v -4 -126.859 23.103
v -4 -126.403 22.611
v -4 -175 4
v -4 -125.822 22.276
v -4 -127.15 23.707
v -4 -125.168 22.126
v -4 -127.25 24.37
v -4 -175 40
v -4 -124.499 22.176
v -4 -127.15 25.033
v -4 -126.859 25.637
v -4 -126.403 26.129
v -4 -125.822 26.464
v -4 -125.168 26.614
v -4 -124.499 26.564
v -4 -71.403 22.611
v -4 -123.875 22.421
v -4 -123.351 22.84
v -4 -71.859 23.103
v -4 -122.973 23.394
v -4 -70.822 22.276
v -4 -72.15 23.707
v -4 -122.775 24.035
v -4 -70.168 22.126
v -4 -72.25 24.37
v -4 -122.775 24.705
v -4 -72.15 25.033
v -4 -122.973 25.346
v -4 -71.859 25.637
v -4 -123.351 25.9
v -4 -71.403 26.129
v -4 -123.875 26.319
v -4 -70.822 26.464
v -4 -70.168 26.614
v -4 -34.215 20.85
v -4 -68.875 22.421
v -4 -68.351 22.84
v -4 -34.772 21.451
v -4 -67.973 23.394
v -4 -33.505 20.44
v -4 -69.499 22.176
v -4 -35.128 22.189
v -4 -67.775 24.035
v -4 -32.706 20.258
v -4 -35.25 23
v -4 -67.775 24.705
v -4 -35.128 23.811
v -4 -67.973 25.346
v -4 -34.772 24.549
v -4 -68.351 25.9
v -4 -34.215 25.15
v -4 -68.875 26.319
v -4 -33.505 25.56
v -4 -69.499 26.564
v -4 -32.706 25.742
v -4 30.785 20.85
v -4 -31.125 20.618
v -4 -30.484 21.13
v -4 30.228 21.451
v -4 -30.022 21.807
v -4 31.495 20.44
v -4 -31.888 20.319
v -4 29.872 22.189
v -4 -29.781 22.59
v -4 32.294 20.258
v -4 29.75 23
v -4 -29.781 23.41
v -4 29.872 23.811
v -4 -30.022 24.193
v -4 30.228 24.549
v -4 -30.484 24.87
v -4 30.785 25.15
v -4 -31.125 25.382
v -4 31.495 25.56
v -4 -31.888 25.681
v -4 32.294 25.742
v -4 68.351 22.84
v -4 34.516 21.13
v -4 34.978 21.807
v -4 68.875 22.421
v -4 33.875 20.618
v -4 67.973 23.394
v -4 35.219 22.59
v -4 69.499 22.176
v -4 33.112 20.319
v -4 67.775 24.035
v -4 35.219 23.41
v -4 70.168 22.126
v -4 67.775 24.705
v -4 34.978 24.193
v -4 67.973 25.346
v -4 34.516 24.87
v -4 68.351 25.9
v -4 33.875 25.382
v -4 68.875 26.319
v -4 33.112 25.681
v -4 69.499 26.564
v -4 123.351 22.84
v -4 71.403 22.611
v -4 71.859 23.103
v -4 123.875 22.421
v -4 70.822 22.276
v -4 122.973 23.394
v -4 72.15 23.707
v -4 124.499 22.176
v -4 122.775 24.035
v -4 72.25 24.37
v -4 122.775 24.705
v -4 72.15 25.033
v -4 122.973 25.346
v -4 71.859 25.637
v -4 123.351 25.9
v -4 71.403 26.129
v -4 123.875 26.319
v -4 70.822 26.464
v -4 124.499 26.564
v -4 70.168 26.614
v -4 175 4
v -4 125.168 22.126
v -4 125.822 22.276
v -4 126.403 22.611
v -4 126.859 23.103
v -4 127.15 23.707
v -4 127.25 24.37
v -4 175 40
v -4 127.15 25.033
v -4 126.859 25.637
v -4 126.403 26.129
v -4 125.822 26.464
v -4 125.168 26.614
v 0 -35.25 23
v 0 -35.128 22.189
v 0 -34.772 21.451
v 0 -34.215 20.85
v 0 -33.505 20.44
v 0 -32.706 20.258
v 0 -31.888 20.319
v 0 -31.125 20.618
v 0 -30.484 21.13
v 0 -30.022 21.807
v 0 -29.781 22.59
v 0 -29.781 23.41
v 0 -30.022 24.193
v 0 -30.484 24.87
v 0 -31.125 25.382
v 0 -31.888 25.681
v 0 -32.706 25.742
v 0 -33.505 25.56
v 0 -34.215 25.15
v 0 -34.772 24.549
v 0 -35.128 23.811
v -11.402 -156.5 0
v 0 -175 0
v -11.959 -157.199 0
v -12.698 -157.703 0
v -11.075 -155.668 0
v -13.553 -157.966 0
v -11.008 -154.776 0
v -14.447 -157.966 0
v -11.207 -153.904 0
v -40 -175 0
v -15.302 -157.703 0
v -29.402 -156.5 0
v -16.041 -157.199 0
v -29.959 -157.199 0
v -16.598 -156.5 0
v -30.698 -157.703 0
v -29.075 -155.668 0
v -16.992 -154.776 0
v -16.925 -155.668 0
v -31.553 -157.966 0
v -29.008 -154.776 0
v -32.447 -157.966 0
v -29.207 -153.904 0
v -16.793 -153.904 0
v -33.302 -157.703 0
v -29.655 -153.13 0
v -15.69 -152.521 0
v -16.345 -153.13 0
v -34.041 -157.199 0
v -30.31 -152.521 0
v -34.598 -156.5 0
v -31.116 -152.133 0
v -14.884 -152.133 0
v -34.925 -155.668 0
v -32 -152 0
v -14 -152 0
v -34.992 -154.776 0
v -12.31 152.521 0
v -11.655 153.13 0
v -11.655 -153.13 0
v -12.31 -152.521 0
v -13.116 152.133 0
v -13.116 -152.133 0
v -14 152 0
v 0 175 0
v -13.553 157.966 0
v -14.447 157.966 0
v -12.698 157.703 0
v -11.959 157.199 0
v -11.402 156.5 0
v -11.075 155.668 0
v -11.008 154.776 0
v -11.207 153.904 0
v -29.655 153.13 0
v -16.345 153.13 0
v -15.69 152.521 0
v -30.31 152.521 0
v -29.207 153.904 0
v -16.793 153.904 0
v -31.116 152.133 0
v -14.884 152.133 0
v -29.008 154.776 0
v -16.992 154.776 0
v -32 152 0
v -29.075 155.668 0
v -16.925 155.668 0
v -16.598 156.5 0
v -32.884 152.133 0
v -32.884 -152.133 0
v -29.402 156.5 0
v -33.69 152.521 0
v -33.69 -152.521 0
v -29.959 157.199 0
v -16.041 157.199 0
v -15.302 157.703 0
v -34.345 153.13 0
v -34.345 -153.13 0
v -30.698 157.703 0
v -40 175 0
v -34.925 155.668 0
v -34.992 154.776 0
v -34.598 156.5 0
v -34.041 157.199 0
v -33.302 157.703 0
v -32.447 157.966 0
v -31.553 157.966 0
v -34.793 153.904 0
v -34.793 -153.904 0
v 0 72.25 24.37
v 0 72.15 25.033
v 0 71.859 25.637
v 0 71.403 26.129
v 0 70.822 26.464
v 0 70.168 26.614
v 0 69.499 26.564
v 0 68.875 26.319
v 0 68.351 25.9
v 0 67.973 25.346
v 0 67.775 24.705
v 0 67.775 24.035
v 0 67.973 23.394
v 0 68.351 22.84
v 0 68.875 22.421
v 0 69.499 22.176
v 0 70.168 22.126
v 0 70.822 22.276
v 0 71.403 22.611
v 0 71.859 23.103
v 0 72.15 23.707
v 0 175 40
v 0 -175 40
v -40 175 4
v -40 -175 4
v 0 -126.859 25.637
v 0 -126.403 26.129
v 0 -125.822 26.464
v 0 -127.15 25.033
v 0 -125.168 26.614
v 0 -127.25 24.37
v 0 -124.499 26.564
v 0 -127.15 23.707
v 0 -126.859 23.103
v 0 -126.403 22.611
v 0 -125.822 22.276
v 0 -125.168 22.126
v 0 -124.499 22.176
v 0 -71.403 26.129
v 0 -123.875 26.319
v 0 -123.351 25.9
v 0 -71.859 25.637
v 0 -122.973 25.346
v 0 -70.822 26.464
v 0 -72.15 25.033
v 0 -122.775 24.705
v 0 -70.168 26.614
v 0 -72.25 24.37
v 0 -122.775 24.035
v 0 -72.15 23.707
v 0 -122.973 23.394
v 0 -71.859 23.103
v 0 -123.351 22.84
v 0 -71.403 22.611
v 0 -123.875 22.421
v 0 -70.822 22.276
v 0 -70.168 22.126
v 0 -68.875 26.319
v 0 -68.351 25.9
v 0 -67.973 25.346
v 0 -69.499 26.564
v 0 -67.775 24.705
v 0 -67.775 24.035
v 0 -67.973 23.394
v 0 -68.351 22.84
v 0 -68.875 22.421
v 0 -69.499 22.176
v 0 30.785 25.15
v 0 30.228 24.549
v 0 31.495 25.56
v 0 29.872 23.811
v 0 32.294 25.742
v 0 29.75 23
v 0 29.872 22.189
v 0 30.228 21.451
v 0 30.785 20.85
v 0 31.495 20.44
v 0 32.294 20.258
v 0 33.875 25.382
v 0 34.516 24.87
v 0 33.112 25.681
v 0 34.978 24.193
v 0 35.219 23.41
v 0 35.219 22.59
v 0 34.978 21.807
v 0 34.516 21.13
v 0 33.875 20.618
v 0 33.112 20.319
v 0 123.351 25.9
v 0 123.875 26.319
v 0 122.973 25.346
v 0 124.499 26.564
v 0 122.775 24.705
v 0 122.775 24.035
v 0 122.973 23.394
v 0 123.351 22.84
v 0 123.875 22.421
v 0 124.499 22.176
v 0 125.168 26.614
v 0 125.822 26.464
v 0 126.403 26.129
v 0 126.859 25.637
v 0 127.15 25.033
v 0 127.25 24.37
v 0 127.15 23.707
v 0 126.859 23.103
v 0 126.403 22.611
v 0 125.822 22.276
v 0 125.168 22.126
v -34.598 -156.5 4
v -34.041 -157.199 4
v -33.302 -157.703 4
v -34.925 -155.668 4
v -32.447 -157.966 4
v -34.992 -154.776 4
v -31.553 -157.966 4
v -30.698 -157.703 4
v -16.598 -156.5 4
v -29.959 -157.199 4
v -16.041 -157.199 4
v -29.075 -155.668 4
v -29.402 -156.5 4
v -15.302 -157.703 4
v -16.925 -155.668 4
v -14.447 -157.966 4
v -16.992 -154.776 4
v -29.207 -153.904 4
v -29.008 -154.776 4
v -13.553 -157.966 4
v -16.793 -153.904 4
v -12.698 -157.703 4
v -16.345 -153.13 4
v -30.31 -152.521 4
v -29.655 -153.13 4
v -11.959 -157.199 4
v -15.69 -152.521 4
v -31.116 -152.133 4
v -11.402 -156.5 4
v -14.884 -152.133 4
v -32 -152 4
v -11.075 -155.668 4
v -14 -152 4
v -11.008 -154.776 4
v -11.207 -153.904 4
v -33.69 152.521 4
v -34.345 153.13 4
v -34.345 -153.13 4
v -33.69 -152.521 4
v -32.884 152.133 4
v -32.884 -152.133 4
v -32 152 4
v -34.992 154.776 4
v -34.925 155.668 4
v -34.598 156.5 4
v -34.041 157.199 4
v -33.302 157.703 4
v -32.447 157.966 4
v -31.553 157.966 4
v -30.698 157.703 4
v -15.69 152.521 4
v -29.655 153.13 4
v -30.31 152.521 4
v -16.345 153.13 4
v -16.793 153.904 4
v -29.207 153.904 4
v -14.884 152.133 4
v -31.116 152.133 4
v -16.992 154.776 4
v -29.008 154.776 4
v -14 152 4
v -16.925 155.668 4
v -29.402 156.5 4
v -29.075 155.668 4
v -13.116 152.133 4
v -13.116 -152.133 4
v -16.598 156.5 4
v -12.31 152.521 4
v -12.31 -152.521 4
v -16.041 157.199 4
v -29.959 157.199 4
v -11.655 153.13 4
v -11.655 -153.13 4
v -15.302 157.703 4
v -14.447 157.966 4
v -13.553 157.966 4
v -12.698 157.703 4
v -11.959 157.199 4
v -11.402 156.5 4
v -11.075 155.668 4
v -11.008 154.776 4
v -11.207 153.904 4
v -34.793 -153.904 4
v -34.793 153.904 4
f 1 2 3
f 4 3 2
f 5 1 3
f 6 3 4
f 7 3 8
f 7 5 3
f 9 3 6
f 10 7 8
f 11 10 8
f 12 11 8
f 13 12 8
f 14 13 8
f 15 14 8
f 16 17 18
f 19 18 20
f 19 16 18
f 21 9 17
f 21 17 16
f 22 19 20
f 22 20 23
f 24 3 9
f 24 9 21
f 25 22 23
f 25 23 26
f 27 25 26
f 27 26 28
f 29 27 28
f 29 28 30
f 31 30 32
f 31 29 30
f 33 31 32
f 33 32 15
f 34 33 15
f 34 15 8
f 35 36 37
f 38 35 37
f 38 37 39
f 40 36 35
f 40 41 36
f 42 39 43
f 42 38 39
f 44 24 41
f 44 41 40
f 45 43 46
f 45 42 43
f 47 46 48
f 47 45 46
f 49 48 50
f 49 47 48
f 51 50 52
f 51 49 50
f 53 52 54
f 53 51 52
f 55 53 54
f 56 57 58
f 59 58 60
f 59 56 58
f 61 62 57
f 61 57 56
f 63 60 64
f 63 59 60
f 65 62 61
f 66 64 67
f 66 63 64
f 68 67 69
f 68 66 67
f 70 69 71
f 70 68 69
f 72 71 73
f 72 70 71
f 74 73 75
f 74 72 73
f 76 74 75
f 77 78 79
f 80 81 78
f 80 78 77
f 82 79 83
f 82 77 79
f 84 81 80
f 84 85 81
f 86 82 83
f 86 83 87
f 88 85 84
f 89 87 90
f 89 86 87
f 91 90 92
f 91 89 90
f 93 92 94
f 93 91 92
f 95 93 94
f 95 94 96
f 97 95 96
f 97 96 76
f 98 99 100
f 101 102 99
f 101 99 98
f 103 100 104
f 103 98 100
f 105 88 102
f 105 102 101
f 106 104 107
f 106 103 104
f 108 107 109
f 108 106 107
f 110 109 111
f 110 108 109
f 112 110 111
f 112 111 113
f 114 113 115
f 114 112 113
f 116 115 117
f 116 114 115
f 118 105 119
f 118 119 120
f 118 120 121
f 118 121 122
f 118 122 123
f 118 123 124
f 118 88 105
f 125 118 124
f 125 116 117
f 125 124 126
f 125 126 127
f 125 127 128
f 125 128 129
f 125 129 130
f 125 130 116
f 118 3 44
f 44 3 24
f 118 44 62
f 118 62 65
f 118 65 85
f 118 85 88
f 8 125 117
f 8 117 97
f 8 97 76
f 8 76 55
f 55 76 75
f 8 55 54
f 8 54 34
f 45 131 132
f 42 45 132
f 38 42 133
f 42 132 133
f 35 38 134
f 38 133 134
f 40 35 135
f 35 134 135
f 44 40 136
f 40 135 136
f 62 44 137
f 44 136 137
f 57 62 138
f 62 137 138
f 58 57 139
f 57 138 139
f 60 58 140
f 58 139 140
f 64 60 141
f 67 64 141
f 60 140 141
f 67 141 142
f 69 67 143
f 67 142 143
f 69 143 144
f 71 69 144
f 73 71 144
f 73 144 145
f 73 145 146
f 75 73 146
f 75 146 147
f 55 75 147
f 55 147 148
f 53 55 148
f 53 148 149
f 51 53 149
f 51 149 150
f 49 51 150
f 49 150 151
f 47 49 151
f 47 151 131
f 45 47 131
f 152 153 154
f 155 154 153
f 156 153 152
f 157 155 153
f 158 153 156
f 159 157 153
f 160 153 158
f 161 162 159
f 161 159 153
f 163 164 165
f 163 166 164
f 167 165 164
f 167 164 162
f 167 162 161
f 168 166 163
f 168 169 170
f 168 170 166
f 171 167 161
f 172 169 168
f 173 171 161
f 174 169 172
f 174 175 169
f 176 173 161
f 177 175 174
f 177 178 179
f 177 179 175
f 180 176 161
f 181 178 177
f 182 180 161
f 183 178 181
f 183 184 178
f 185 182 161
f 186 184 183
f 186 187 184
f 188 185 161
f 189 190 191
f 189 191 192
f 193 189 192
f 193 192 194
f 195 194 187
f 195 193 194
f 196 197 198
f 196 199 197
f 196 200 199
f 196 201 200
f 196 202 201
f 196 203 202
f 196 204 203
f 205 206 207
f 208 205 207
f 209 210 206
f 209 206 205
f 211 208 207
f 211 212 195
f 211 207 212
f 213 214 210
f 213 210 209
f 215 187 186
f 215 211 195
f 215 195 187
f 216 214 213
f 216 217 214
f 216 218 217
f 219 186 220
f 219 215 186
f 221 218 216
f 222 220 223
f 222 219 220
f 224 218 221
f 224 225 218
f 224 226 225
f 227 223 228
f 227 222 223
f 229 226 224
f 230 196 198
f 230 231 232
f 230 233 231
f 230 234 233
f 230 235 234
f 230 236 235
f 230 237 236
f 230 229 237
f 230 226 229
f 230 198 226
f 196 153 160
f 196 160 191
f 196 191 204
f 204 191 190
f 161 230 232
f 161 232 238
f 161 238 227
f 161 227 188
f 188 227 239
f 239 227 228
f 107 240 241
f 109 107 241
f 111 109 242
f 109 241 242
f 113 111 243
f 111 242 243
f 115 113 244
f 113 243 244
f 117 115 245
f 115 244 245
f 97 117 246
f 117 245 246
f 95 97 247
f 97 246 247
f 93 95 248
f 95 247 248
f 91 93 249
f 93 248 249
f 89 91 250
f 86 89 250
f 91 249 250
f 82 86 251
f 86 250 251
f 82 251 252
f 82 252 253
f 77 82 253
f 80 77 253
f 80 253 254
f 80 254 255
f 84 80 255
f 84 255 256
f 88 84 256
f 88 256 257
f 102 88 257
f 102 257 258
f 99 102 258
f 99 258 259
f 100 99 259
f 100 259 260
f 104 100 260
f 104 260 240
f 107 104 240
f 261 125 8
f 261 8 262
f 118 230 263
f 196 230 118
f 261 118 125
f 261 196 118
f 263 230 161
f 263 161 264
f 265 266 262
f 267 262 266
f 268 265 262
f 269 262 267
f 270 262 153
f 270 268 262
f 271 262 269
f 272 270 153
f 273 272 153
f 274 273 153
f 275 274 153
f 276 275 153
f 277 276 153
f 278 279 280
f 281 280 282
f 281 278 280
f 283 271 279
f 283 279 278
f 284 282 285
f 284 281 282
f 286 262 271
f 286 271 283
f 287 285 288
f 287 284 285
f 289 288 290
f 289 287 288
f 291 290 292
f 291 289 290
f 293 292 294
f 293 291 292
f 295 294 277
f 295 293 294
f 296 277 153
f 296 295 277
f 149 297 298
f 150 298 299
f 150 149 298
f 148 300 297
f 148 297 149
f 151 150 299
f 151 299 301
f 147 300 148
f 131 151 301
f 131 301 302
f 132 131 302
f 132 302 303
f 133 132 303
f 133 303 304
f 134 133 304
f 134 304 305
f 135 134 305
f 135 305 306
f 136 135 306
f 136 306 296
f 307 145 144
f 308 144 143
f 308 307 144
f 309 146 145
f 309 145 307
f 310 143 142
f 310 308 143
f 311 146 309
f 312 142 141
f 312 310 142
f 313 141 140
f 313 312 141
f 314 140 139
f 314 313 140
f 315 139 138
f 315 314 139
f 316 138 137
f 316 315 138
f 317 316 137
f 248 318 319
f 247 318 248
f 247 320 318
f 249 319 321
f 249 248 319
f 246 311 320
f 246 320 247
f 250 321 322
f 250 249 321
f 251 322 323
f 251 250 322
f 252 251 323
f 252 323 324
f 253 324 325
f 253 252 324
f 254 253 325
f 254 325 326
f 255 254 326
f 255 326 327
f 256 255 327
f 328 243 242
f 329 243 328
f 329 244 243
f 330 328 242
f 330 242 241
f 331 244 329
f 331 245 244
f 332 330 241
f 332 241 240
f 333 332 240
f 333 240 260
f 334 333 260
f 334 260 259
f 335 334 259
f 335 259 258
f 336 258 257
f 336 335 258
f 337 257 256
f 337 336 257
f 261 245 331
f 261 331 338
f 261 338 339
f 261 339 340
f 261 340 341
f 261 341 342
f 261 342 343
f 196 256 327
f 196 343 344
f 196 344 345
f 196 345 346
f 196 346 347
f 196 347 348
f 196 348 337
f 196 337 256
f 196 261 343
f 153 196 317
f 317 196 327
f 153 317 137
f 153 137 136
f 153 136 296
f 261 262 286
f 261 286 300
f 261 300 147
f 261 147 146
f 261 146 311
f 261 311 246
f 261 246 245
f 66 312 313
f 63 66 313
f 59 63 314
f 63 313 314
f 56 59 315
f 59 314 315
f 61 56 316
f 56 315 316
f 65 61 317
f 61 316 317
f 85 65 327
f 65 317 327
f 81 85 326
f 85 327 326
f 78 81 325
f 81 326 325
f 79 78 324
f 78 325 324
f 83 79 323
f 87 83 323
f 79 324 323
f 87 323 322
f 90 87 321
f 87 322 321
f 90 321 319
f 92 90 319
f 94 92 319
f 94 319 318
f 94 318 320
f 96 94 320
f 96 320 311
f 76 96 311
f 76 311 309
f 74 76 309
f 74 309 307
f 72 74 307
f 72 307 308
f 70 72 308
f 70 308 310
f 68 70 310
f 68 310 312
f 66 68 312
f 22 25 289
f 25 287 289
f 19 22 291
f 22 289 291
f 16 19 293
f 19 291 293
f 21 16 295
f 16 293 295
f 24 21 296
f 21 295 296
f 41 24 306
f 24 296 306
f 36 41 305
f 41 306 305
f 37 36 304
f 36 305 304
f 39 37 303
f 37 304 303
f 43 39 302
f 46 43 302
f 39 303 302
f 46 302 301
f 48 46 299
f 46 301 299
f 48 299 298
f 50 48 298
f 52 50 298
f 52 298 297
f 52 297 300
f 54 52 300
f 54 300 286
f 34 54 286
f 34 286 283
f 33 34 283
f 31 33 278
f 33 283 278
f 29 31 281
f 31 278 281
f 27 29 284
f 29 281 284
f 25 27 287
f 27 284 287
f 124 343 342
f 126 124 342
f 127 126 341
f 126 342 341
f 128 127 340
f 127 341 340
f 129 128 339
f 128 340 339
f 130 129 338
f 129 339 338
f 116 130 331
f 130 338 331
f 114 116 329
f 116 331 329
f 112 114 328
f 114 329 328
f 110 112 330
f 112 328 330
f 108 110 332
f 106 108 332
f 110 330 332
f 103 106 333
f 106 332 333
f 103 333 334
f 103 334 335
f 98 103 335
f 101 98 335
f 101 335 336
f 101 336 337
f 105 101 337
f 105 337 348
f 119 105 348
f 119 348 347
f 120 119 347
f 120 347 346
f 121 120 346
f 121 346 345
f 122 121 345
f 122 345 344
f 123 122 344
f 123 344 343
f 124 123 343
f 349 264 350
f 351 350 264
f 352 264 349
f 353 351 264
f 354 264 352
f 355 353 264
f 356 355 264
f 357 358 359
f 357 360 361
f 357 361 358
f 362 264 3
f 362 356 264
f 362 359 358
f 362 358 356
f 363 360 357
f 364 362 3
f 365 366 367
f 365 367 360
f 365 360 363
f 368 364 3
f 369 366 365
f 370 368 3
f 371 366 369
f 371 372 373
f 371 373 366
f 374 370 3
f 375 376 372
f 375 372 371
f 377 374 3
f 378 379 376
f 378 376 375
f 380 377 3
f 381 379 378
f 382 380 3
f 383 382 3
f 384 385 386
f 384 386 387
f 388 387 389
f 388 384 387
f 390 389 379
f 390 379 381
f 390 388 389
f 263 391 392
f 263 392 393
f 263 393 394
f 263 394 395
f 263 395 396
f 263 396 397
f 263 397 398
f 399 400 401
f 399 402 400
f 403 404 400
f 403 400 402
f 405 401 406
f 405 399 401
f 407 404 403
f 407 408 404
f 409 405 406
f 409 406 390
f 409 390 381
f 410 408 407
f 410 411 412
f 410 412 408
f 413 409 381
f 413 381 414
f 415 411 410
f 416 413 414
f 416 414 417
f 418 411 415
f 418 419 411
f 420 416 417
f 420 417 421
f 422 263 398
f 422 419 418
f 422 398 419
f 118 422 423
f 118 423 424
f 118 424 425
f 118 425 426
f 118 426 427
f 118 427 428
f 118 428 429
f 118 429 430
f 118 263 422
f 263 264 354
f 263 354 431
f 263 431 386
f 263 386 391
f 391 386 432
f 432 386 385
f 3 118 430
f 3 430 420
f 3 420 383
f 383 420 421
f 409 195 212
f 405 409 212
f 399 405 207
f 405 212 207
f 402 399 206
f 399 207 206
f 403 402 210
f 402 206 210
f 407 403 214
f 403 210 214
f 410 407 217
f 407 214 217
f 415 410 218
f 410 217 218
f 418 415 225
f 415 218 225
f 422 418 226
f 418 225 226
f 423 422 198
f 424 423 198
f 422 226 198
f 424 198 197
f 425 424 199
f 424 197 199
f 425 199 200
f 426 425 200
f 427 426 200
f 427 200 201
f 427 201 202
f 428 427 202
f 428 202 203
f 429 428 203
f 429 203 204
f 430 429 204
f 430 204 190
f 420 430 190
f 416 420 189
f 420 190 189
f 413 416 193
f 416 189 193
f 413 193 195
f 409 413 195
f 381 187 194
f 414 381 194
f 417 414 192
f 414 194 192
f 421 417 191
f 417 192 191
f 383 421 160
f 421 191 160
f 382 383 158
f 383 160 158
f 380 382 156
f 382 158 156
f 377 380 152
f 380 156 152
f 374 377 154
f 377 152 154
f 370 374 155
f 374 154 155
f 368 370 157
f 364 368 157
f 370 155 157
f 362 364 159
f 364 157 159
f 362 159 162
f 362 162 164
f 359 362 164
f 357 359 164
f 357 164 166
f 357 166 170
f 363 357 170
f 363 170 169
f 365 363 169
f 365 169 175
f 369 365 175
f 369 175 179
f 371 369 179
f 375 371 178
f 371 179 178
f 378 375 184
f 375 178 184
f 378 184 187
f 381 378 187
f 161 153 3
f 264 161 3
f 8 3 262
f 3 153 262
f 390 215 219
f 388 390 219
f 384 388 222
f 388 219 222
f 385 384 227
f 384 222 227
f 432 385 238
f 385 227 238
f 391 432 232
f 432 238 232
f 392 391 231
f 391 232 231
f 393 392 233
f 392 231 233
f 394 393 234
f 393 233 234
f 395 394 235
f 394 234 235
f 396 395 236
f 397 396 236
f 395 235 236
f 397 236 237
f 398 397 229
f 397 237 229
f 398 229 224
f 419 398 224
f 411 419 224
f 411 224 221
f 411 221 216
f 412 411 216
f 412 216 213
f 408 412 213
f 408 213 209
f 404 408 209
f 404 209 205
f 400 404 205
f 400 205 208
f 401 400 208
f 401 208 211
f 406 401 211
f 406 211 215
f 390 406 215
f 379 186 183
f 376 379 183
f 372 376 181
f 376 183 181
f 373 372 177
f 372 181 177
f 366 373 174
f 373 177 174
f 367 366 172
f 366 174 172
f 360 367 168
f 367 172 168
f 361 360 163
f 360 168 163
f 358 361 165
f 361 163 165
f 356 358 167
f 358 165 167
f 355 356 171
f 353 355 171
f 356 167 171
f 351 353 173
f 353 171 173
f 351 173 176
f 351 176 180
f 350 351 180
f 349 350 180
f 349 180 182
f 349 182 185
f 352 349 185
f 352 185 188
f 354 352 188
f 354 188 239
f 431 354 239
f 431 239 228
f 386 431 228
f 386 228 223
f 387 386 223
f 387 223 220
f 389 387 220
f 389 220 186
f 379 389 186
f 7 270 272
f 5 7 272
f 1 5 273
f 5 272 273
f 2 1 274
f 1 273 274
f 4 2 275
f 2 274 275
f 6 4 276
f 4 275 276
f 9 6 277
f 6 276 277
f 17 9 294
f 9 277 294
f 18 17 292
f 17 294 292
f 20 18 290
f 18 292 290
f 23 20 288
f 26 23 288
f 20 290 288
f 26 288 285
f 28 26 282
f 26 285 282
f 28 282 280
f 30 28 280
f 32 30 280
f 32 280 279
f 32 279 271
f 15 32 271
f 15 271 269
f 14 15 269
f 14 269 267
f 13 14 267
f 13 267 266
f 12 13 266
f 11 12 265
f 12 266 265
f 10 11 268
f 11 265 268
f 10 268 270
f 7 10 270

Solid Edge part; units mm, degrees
sketch "Sketch1" plane through (-9.04, 0, 33.0648) normal (0, -1, 0) x (1, 0, 0)
  line L0 (-30.96, -29.0648) -> (5.04, -29.0648)
  line L1 (5.04, -29.0648) -> (5.04, 6.9352)
  line L2 (5.04, 6.9352) -> (9.04, 6.9352)
  line L3 (9.04, 6.9352) -> (9.04, -33.0648)
  line L4 (9.04, -33.0648) -> (-30.96, -33.0648)
  line L5 (-30.96, -33.0648) -> (-30.96, -29.0648)
extrude "Protrusion1" add sketch "Sketch1" along normal mid plane 350
sketch "Sketch2" plane through (-20, 0, 0) normal (0, 0, -1) x (0, -1, 0)
  circle A0 centre (-155, 12) radius 3
  circle A1 centre (-155, -6) radius 3
  dimension "D1" = 10
  dimension "D2" = 18
  dimension "D3" = 20
extrude "Cutout1" cut sketch "Sketch2" against normal through all
mirror "Mirror1" about plane through (0, 0, 0) normal (0, -1, 0) of "Cutout1"
sketch "Sketch3" plane through (0, 0, 20) normal (1, 0, 0) x (0, -1, 0)
  circle A0 centre (-32.5, -3) radius 2.75
  circle A1 centre (32.5, -3) radius 2.75
  dimension "D1" = 65
  dimension "D2" = 5.5
  dimension "D3" = 23
extrude "Cutout2" cut sketch "Sketch3" against normal through all
sketch "Sketch4" plane through (0, 0, 20) normal (1, 0, 0) x (0, -1, 0)
  circle A0 centre (70, -4.37) radius 2.25
  circle A1 centre (125, -4.37) radius 2.25
  dimension "D1" = 4.5
  dimension "D2" = 15.63
  dimension "D3" = 55
  dimension "D4" = 50
extrude "Cutout3" cut sketch "Sketch4" against normal through all
mirror "Mirror2" about plane through (0, 0, 0) normal (0, -1, 0) of "Cutout3"
